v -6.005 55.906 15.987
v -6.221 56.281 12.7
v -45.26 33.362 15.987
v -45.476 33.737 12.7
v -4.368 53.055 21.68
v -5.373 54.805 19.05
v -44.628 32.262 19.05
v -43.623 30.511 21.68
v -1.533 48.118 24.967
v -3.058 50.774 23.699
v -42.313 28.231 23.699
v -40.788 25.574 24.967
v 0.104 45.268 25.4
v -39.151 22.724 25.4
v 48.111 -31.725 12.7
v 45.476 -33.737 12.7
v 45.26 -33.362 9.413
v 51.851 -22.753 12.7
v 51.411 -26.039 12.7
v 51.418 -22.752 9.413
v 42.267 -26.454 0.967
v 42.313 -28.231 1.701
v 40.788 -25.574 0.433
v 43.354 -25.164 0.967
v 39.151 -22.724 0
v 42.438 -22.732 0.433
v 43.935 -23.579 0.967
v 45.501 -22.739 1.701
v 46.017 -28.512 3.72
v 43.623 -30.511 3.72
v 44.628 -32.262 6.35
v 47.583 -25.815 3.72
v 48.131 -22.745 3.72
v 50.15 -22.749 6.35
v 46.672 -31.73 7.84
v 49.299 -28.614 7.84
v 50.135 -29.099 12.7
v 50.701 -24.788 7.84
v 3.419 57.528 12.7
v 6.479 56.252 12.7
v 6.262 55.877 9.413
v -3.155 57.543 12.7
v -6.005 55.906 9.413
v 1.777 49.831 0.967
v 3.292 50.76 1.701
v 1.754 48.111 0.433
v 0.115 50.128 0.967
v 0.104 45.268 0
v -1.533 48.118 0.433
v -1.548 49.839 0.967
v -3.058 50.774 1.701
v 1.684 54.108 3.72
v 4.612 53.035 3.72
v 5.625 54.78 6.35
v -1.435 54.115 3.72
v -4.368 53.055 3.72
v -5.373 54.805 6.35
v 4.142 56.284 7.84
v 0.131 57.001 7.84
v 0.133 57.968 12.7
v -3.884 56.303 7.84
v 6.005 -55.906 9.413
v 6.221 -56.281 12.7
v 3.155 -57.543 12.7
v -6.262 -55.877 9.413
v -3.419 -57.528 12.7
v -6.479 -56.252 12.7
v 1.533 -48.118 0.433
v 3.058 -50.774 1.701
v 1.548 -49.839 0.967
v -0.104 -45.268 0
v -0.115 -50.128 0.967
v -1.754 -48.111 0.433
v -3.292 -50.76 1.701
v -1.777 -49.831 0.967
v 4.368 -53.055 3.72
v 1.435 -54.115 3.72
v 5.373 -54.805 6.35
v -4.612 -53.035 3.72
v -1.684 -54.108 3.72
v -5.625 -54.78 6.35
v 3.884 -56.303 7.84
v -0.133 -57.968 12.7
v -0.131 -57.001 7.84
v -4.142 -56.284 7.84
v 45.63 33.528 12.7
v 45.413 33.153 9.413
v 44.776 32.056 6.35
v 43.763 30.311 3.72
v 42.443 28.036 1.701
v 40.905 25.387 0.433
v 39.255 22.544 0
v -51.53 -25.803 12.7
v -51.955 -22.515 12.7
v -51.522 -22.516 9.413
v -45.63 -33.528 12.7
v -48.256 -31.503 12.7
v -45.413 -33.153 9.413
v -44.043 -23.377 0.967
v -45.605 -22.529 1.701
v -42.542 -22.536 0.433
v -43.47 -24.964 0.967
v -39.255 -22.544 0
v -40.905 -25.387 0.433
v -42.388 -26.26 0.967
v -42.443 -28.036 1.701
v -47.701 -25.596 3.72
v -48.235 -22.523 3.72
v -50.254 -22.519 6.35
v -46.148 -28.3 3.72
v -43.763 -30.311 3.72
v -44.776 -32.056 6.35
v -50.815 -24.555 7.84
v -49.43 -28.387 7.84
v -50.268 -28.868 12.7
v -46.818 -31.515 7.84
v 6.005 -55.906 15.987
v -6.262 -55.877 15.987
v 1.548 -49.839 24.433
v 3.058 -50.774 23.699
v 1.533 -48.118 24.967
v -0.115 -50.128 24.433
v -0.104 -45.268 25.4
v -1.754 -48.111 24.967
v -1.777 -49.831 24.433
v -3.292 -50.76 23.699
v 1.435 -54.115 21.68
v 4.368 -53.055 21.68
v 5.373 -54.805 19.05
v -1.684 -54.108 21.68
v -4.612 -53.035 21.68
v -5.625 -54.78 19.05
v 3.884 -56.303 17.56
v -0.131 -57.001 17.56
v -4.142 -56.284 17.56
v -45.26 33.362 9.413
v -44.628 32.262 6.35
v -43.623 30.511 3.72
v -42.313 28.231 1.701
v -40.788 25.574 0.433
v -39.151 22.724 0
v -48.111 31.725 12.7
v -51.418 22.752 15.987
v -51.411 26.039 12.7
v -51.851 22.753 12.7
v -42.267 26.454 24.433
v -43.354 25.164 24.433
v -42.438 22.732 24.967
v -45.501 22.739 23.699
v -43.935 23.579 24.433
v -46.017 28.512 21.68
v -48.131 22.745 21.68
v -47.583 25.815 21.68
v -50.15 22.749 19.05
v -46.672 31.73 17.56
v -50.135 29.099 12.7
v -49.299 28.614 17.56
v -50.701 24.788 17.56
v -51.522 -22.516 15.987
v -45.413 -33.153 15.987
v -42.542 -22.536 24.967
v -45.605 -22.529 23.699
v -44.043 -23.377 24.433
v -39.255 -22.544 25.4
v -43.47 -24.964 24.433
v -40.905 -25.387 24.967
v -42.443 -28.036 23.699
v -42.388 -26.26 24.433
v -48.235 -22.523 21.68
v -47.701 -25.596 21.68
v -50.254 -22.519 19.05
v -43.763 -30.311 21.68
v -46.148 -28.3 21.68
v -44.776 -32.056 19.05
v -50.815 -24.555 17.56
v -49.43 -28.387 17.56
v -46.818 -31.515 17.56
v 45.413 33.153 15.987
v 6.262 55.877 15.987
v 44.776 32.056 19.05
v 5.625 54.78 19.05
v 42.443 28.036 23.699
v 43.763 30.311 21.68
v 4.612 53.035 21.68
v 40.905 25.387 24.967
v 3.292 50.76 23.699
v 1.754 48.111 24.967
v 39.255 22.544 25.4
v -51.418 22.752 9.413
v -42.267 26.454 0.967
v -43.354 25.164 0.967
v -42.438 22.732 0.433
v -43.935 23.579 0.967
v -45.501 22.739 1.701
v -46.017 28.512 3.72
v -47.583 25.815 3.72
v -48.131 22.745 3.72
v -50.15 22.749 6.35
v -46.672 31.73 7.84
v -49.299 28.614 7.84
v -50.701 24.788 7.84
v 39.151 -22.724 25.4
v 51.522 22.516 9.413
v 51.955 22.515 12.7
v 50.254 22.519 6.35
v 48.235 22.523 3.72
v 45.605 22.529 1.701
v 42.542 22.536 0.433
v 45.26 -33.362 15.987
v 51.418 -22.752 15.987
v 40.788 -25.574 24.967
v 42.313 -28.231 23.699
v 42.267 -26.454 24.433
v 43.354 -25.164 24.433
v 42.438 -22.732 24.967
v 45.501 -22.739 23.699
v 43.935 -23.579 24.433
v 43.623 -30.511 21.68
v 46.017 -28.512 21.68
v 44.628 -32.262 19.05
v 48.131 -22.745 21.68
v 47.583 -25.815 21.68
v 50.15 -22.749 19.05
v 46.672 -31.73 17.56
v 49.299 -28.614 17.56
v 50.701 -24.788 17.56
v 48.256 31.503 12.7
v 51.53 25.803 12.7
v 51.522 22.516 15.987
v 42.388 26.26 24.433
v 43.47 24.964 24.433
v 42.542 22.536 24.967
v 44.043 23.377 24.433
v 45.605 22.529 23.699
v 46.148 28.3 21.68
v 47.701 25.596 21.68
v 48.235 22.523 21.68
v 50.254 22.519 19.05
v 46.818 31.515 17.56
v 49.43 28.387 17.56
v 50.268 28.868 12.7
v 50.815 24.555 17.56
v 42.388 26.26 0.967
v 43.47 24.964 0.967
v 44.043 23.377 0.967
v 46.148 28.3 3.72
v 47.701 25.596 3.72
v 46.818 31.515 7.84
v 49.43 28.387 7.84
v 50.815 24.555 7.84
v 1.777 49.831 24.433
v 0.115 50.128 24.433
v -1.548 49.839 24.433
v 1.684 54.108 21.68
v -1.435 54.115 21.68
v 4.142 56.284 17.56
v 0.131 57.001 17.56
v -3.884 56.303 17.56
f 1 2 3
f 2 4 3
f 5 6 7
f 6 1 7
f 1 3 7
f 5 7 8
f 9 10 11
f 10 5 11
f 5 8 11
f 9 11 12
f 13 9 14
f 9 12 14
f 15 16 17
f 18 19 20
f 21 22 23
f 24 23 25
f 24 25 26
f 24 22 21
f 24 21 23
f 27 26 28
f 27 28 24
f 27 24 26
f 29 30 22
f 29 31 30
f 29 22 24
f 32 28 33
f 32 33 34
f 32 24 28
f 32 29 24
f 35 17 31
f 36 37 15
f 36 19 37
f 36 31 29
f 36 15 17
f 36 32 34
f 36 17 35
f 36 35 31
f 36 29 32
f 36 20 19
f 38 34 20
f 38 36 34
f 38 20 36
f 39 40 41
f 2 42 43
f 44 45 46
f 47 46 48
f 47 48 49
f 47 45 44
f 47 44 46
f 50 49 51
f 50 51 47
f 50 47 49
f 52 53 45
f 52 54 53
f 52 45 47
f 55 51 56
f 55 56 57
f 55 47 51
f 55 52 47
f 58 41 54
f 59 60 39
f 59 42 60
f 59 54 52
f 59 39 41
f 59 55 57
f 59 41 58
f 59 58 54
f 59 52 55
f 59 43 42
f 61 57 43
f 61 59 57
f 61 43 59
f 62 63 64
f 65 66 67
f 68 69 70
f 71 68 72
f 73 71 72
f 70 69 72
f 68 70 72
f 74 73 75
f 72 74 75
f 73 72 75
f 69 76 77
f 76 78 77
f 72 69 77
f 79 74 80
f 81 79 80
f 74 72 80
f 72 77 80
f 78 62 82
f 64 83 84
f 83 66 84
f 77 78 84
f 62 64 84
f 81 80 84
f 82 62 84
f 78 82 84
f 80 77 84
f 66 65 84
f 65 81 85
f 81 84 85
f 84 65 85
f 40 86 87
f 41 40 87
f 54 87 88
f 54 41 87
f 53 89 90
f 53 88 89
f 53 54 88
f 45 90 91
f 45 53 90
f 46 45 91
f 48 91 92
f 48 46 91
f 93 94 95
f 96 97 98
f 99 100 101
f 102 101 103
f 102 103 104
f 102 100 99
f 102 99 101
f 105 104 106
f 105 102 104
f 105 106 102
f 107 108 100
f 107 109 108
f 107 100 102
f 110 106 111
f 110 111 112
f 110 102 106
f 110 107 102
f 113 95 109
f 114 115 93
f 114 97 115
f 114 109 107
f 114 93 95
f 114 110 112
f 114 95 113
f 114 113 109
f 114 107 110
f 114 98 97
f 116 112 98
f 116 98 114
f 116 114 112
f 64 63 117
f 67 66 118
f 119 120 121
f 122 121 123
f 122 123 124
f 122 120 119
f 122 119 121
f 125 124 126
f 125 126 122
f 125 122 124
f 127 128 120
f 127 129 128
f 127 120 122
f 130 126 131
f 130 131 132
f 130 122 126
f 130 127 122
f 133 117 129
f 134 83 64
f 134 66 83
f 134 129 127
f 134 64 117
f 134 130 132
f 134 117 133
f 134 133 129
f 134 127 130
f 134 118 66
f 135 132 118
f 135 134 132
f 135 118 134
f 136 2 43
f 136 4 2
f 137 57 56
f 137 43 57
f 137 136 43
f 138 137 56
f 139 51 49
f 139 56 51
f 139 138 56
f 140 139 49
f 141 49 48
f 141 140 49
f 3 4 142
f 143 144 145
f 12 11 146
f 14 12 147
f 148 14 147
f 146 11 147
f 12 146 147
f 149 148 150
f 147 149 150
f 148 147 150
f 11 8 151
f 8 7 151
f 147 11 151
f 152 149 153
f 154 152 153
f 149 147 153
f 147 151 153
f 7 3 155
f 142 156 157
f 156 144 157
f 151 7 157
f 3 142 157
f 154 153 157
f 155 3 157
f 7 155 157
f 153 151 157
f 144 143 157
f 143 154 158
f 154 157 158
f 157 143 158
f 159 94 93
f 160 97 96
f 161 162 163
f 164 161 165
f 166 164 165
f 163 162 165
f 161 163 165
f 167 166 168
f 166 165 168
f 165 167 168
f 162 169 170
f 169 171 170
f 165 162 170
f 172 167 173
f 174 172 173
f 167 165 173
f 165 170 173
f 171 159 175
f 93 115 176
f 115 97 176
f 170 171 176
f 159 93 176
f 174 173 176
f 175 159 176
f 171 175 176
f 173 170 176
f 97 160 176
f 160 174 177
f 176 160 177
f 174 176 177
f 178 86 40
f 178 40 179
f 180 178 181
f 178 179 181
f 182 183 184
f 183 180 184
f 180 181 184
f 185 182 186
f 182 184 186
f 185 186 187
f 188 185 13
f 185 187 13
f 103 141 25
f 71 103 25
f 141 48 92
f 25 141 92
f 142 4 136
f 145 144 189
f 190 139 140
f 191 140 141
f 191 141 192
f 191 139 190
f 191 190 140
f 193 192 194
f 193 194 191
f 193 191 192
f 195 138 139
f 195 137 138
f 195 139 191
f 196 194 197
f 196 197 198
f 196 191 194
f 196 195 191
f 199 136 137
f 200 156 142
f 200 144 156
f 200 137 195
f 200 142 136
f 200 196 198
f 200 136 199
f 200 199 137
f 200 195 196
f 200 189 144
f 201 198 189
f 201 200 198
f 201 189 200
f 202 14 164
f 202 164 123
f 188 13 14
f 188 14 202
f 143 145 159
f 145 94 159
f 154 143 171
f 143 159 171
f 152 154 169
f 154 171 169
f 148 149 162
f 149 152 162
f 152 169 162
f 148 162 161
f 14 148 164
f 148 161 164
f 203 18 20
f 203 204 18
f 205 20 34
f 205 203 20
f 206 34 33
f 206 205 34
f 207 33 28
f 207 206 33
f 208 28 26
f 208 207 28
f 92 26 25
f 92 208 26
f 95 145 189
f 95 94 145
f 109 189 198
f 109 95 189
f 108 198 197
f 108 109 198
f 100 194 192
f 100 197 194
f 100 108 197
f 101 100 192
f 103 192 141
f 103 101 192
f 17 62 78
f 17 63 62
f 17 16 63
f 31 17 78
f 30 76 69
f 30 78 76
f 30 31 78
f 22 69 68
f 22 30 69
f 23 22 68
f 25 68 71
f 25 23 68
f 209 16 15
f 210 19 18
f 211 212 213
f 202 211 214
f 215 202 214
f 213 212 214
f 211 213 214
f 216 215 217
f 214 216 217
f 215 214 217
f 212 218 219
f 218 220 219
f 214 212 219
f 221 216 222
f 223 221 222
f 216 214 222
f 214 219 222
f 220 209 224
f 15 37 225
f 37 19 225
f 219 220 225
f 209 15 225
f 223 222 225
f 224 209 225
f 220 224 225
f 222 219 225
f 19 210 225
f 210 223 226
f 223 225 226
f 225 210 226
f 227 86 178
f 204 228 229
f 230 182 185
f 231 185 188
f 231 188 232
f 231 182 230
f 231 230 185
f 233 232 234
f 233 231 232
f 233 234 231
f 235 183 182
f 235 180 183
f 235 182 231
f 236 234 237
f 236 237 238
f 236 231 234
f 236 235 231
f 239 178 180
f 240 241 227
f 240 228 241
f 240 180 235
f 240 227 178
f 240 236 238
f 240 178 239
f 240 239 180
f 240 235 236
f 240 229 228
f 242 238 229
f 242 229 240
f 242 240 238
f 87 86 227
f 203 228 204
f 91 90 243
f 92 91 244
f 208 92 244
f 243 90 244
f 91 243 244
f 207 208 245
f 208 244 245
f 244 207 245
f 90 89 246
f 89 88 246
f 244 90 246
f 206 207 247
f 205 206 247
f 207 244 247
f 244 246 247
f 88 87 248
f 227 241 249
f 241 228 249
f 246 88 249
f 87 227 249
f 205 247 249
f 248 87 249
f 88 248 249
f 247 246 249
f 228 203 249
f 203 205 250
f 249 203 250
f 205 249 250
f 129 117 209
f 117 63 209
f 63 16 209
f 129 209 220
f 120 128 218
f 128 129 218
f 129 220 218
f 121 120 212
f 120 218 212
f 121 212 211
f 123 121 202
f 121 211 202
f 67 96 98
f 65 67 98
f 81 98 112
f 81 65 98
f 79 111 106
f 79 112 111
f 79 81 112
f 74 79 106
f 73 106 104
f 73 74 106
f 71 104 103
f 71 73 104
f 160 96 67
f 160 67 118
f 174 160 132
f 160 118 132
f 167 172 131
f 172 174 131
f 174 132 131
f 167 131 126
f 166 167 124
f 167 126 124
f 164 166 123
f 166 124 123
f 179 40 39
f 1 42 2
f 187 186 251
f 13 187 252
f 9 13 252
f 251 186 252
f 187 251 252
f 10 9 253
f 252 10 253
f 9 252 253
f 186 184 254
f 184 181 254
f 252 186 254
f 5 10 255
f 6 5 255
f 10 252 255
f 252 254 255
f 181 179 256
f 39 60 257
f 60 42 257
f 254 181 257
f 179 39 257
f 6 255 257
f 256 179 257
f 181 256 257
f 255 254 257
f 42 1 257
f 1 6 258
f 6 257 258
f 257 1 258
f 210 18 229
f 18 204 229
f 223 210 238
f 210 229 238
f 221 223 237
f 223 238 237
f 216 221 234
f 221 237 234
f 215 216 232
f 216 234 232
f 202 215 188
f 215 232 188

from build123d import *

# Parameters (mm, degrees)
F1_DEPTH = 25.4
F2_R     = 12.69999


# Not quite as in the source:
# - a fillet or chamfer is up to 0.001 mm smaller than in the source, because OpenCascade refuses the exact size


with BuildPart() as f1:
    # F0 (on Top) → F1 (new body)
    with BuildSketch(Plane.XY):
        Polygon((51.9719609901, 29.8469270905), (0.1377834097, 59.9325020472), (-51.8341775803, 30.0855749566), (-51.9719609901, -29.8469270905), (-0.1377834097, -59.9325020472), (51.8341775803, -30.0855749566), align=None)
    extrude(amount=F1_DEPTH)

    # F2 (radius 12.7 in the source; OpenCascade refuses exactly that, so slightly less here)
    f2_edges = [f1.edges().sort_by_distance(p)[0] for p in [
        (51.971961, 29.846927, 12.7),
        (0.137783, 59.932502, 12.7),
        (26.054872, 44.889715, 0),
        (26.054872, 44.889715, 25.4),
        (-51.834178, 30.085575, 12.7),
        (-25.848197, 45.009039, 0),
        (-25.848197, 45.009039, 25.4),
        (-51.971961, -29.846927, 12.7),
        (-51.903069, 0.119324, 0),
        (-51.903069, 0.119324, 25.4),
        (-0.137783, -59.932502, 12.7),
        (51.834178, -30.085575, 12.7),
        (25.848197, -45.009039, 0),
        (25.848197, -45.009039, 25.4),
        (-26.054872, -44.889715, 0),
        (-26.054872, -44.889715, 25.4),
        (51.903069, -0.119324, 0),
        (51.903069, -0.119324, 25.4),
    ]]
    fillet(f2_edges, radius=F2_R)


solid = f1.part
